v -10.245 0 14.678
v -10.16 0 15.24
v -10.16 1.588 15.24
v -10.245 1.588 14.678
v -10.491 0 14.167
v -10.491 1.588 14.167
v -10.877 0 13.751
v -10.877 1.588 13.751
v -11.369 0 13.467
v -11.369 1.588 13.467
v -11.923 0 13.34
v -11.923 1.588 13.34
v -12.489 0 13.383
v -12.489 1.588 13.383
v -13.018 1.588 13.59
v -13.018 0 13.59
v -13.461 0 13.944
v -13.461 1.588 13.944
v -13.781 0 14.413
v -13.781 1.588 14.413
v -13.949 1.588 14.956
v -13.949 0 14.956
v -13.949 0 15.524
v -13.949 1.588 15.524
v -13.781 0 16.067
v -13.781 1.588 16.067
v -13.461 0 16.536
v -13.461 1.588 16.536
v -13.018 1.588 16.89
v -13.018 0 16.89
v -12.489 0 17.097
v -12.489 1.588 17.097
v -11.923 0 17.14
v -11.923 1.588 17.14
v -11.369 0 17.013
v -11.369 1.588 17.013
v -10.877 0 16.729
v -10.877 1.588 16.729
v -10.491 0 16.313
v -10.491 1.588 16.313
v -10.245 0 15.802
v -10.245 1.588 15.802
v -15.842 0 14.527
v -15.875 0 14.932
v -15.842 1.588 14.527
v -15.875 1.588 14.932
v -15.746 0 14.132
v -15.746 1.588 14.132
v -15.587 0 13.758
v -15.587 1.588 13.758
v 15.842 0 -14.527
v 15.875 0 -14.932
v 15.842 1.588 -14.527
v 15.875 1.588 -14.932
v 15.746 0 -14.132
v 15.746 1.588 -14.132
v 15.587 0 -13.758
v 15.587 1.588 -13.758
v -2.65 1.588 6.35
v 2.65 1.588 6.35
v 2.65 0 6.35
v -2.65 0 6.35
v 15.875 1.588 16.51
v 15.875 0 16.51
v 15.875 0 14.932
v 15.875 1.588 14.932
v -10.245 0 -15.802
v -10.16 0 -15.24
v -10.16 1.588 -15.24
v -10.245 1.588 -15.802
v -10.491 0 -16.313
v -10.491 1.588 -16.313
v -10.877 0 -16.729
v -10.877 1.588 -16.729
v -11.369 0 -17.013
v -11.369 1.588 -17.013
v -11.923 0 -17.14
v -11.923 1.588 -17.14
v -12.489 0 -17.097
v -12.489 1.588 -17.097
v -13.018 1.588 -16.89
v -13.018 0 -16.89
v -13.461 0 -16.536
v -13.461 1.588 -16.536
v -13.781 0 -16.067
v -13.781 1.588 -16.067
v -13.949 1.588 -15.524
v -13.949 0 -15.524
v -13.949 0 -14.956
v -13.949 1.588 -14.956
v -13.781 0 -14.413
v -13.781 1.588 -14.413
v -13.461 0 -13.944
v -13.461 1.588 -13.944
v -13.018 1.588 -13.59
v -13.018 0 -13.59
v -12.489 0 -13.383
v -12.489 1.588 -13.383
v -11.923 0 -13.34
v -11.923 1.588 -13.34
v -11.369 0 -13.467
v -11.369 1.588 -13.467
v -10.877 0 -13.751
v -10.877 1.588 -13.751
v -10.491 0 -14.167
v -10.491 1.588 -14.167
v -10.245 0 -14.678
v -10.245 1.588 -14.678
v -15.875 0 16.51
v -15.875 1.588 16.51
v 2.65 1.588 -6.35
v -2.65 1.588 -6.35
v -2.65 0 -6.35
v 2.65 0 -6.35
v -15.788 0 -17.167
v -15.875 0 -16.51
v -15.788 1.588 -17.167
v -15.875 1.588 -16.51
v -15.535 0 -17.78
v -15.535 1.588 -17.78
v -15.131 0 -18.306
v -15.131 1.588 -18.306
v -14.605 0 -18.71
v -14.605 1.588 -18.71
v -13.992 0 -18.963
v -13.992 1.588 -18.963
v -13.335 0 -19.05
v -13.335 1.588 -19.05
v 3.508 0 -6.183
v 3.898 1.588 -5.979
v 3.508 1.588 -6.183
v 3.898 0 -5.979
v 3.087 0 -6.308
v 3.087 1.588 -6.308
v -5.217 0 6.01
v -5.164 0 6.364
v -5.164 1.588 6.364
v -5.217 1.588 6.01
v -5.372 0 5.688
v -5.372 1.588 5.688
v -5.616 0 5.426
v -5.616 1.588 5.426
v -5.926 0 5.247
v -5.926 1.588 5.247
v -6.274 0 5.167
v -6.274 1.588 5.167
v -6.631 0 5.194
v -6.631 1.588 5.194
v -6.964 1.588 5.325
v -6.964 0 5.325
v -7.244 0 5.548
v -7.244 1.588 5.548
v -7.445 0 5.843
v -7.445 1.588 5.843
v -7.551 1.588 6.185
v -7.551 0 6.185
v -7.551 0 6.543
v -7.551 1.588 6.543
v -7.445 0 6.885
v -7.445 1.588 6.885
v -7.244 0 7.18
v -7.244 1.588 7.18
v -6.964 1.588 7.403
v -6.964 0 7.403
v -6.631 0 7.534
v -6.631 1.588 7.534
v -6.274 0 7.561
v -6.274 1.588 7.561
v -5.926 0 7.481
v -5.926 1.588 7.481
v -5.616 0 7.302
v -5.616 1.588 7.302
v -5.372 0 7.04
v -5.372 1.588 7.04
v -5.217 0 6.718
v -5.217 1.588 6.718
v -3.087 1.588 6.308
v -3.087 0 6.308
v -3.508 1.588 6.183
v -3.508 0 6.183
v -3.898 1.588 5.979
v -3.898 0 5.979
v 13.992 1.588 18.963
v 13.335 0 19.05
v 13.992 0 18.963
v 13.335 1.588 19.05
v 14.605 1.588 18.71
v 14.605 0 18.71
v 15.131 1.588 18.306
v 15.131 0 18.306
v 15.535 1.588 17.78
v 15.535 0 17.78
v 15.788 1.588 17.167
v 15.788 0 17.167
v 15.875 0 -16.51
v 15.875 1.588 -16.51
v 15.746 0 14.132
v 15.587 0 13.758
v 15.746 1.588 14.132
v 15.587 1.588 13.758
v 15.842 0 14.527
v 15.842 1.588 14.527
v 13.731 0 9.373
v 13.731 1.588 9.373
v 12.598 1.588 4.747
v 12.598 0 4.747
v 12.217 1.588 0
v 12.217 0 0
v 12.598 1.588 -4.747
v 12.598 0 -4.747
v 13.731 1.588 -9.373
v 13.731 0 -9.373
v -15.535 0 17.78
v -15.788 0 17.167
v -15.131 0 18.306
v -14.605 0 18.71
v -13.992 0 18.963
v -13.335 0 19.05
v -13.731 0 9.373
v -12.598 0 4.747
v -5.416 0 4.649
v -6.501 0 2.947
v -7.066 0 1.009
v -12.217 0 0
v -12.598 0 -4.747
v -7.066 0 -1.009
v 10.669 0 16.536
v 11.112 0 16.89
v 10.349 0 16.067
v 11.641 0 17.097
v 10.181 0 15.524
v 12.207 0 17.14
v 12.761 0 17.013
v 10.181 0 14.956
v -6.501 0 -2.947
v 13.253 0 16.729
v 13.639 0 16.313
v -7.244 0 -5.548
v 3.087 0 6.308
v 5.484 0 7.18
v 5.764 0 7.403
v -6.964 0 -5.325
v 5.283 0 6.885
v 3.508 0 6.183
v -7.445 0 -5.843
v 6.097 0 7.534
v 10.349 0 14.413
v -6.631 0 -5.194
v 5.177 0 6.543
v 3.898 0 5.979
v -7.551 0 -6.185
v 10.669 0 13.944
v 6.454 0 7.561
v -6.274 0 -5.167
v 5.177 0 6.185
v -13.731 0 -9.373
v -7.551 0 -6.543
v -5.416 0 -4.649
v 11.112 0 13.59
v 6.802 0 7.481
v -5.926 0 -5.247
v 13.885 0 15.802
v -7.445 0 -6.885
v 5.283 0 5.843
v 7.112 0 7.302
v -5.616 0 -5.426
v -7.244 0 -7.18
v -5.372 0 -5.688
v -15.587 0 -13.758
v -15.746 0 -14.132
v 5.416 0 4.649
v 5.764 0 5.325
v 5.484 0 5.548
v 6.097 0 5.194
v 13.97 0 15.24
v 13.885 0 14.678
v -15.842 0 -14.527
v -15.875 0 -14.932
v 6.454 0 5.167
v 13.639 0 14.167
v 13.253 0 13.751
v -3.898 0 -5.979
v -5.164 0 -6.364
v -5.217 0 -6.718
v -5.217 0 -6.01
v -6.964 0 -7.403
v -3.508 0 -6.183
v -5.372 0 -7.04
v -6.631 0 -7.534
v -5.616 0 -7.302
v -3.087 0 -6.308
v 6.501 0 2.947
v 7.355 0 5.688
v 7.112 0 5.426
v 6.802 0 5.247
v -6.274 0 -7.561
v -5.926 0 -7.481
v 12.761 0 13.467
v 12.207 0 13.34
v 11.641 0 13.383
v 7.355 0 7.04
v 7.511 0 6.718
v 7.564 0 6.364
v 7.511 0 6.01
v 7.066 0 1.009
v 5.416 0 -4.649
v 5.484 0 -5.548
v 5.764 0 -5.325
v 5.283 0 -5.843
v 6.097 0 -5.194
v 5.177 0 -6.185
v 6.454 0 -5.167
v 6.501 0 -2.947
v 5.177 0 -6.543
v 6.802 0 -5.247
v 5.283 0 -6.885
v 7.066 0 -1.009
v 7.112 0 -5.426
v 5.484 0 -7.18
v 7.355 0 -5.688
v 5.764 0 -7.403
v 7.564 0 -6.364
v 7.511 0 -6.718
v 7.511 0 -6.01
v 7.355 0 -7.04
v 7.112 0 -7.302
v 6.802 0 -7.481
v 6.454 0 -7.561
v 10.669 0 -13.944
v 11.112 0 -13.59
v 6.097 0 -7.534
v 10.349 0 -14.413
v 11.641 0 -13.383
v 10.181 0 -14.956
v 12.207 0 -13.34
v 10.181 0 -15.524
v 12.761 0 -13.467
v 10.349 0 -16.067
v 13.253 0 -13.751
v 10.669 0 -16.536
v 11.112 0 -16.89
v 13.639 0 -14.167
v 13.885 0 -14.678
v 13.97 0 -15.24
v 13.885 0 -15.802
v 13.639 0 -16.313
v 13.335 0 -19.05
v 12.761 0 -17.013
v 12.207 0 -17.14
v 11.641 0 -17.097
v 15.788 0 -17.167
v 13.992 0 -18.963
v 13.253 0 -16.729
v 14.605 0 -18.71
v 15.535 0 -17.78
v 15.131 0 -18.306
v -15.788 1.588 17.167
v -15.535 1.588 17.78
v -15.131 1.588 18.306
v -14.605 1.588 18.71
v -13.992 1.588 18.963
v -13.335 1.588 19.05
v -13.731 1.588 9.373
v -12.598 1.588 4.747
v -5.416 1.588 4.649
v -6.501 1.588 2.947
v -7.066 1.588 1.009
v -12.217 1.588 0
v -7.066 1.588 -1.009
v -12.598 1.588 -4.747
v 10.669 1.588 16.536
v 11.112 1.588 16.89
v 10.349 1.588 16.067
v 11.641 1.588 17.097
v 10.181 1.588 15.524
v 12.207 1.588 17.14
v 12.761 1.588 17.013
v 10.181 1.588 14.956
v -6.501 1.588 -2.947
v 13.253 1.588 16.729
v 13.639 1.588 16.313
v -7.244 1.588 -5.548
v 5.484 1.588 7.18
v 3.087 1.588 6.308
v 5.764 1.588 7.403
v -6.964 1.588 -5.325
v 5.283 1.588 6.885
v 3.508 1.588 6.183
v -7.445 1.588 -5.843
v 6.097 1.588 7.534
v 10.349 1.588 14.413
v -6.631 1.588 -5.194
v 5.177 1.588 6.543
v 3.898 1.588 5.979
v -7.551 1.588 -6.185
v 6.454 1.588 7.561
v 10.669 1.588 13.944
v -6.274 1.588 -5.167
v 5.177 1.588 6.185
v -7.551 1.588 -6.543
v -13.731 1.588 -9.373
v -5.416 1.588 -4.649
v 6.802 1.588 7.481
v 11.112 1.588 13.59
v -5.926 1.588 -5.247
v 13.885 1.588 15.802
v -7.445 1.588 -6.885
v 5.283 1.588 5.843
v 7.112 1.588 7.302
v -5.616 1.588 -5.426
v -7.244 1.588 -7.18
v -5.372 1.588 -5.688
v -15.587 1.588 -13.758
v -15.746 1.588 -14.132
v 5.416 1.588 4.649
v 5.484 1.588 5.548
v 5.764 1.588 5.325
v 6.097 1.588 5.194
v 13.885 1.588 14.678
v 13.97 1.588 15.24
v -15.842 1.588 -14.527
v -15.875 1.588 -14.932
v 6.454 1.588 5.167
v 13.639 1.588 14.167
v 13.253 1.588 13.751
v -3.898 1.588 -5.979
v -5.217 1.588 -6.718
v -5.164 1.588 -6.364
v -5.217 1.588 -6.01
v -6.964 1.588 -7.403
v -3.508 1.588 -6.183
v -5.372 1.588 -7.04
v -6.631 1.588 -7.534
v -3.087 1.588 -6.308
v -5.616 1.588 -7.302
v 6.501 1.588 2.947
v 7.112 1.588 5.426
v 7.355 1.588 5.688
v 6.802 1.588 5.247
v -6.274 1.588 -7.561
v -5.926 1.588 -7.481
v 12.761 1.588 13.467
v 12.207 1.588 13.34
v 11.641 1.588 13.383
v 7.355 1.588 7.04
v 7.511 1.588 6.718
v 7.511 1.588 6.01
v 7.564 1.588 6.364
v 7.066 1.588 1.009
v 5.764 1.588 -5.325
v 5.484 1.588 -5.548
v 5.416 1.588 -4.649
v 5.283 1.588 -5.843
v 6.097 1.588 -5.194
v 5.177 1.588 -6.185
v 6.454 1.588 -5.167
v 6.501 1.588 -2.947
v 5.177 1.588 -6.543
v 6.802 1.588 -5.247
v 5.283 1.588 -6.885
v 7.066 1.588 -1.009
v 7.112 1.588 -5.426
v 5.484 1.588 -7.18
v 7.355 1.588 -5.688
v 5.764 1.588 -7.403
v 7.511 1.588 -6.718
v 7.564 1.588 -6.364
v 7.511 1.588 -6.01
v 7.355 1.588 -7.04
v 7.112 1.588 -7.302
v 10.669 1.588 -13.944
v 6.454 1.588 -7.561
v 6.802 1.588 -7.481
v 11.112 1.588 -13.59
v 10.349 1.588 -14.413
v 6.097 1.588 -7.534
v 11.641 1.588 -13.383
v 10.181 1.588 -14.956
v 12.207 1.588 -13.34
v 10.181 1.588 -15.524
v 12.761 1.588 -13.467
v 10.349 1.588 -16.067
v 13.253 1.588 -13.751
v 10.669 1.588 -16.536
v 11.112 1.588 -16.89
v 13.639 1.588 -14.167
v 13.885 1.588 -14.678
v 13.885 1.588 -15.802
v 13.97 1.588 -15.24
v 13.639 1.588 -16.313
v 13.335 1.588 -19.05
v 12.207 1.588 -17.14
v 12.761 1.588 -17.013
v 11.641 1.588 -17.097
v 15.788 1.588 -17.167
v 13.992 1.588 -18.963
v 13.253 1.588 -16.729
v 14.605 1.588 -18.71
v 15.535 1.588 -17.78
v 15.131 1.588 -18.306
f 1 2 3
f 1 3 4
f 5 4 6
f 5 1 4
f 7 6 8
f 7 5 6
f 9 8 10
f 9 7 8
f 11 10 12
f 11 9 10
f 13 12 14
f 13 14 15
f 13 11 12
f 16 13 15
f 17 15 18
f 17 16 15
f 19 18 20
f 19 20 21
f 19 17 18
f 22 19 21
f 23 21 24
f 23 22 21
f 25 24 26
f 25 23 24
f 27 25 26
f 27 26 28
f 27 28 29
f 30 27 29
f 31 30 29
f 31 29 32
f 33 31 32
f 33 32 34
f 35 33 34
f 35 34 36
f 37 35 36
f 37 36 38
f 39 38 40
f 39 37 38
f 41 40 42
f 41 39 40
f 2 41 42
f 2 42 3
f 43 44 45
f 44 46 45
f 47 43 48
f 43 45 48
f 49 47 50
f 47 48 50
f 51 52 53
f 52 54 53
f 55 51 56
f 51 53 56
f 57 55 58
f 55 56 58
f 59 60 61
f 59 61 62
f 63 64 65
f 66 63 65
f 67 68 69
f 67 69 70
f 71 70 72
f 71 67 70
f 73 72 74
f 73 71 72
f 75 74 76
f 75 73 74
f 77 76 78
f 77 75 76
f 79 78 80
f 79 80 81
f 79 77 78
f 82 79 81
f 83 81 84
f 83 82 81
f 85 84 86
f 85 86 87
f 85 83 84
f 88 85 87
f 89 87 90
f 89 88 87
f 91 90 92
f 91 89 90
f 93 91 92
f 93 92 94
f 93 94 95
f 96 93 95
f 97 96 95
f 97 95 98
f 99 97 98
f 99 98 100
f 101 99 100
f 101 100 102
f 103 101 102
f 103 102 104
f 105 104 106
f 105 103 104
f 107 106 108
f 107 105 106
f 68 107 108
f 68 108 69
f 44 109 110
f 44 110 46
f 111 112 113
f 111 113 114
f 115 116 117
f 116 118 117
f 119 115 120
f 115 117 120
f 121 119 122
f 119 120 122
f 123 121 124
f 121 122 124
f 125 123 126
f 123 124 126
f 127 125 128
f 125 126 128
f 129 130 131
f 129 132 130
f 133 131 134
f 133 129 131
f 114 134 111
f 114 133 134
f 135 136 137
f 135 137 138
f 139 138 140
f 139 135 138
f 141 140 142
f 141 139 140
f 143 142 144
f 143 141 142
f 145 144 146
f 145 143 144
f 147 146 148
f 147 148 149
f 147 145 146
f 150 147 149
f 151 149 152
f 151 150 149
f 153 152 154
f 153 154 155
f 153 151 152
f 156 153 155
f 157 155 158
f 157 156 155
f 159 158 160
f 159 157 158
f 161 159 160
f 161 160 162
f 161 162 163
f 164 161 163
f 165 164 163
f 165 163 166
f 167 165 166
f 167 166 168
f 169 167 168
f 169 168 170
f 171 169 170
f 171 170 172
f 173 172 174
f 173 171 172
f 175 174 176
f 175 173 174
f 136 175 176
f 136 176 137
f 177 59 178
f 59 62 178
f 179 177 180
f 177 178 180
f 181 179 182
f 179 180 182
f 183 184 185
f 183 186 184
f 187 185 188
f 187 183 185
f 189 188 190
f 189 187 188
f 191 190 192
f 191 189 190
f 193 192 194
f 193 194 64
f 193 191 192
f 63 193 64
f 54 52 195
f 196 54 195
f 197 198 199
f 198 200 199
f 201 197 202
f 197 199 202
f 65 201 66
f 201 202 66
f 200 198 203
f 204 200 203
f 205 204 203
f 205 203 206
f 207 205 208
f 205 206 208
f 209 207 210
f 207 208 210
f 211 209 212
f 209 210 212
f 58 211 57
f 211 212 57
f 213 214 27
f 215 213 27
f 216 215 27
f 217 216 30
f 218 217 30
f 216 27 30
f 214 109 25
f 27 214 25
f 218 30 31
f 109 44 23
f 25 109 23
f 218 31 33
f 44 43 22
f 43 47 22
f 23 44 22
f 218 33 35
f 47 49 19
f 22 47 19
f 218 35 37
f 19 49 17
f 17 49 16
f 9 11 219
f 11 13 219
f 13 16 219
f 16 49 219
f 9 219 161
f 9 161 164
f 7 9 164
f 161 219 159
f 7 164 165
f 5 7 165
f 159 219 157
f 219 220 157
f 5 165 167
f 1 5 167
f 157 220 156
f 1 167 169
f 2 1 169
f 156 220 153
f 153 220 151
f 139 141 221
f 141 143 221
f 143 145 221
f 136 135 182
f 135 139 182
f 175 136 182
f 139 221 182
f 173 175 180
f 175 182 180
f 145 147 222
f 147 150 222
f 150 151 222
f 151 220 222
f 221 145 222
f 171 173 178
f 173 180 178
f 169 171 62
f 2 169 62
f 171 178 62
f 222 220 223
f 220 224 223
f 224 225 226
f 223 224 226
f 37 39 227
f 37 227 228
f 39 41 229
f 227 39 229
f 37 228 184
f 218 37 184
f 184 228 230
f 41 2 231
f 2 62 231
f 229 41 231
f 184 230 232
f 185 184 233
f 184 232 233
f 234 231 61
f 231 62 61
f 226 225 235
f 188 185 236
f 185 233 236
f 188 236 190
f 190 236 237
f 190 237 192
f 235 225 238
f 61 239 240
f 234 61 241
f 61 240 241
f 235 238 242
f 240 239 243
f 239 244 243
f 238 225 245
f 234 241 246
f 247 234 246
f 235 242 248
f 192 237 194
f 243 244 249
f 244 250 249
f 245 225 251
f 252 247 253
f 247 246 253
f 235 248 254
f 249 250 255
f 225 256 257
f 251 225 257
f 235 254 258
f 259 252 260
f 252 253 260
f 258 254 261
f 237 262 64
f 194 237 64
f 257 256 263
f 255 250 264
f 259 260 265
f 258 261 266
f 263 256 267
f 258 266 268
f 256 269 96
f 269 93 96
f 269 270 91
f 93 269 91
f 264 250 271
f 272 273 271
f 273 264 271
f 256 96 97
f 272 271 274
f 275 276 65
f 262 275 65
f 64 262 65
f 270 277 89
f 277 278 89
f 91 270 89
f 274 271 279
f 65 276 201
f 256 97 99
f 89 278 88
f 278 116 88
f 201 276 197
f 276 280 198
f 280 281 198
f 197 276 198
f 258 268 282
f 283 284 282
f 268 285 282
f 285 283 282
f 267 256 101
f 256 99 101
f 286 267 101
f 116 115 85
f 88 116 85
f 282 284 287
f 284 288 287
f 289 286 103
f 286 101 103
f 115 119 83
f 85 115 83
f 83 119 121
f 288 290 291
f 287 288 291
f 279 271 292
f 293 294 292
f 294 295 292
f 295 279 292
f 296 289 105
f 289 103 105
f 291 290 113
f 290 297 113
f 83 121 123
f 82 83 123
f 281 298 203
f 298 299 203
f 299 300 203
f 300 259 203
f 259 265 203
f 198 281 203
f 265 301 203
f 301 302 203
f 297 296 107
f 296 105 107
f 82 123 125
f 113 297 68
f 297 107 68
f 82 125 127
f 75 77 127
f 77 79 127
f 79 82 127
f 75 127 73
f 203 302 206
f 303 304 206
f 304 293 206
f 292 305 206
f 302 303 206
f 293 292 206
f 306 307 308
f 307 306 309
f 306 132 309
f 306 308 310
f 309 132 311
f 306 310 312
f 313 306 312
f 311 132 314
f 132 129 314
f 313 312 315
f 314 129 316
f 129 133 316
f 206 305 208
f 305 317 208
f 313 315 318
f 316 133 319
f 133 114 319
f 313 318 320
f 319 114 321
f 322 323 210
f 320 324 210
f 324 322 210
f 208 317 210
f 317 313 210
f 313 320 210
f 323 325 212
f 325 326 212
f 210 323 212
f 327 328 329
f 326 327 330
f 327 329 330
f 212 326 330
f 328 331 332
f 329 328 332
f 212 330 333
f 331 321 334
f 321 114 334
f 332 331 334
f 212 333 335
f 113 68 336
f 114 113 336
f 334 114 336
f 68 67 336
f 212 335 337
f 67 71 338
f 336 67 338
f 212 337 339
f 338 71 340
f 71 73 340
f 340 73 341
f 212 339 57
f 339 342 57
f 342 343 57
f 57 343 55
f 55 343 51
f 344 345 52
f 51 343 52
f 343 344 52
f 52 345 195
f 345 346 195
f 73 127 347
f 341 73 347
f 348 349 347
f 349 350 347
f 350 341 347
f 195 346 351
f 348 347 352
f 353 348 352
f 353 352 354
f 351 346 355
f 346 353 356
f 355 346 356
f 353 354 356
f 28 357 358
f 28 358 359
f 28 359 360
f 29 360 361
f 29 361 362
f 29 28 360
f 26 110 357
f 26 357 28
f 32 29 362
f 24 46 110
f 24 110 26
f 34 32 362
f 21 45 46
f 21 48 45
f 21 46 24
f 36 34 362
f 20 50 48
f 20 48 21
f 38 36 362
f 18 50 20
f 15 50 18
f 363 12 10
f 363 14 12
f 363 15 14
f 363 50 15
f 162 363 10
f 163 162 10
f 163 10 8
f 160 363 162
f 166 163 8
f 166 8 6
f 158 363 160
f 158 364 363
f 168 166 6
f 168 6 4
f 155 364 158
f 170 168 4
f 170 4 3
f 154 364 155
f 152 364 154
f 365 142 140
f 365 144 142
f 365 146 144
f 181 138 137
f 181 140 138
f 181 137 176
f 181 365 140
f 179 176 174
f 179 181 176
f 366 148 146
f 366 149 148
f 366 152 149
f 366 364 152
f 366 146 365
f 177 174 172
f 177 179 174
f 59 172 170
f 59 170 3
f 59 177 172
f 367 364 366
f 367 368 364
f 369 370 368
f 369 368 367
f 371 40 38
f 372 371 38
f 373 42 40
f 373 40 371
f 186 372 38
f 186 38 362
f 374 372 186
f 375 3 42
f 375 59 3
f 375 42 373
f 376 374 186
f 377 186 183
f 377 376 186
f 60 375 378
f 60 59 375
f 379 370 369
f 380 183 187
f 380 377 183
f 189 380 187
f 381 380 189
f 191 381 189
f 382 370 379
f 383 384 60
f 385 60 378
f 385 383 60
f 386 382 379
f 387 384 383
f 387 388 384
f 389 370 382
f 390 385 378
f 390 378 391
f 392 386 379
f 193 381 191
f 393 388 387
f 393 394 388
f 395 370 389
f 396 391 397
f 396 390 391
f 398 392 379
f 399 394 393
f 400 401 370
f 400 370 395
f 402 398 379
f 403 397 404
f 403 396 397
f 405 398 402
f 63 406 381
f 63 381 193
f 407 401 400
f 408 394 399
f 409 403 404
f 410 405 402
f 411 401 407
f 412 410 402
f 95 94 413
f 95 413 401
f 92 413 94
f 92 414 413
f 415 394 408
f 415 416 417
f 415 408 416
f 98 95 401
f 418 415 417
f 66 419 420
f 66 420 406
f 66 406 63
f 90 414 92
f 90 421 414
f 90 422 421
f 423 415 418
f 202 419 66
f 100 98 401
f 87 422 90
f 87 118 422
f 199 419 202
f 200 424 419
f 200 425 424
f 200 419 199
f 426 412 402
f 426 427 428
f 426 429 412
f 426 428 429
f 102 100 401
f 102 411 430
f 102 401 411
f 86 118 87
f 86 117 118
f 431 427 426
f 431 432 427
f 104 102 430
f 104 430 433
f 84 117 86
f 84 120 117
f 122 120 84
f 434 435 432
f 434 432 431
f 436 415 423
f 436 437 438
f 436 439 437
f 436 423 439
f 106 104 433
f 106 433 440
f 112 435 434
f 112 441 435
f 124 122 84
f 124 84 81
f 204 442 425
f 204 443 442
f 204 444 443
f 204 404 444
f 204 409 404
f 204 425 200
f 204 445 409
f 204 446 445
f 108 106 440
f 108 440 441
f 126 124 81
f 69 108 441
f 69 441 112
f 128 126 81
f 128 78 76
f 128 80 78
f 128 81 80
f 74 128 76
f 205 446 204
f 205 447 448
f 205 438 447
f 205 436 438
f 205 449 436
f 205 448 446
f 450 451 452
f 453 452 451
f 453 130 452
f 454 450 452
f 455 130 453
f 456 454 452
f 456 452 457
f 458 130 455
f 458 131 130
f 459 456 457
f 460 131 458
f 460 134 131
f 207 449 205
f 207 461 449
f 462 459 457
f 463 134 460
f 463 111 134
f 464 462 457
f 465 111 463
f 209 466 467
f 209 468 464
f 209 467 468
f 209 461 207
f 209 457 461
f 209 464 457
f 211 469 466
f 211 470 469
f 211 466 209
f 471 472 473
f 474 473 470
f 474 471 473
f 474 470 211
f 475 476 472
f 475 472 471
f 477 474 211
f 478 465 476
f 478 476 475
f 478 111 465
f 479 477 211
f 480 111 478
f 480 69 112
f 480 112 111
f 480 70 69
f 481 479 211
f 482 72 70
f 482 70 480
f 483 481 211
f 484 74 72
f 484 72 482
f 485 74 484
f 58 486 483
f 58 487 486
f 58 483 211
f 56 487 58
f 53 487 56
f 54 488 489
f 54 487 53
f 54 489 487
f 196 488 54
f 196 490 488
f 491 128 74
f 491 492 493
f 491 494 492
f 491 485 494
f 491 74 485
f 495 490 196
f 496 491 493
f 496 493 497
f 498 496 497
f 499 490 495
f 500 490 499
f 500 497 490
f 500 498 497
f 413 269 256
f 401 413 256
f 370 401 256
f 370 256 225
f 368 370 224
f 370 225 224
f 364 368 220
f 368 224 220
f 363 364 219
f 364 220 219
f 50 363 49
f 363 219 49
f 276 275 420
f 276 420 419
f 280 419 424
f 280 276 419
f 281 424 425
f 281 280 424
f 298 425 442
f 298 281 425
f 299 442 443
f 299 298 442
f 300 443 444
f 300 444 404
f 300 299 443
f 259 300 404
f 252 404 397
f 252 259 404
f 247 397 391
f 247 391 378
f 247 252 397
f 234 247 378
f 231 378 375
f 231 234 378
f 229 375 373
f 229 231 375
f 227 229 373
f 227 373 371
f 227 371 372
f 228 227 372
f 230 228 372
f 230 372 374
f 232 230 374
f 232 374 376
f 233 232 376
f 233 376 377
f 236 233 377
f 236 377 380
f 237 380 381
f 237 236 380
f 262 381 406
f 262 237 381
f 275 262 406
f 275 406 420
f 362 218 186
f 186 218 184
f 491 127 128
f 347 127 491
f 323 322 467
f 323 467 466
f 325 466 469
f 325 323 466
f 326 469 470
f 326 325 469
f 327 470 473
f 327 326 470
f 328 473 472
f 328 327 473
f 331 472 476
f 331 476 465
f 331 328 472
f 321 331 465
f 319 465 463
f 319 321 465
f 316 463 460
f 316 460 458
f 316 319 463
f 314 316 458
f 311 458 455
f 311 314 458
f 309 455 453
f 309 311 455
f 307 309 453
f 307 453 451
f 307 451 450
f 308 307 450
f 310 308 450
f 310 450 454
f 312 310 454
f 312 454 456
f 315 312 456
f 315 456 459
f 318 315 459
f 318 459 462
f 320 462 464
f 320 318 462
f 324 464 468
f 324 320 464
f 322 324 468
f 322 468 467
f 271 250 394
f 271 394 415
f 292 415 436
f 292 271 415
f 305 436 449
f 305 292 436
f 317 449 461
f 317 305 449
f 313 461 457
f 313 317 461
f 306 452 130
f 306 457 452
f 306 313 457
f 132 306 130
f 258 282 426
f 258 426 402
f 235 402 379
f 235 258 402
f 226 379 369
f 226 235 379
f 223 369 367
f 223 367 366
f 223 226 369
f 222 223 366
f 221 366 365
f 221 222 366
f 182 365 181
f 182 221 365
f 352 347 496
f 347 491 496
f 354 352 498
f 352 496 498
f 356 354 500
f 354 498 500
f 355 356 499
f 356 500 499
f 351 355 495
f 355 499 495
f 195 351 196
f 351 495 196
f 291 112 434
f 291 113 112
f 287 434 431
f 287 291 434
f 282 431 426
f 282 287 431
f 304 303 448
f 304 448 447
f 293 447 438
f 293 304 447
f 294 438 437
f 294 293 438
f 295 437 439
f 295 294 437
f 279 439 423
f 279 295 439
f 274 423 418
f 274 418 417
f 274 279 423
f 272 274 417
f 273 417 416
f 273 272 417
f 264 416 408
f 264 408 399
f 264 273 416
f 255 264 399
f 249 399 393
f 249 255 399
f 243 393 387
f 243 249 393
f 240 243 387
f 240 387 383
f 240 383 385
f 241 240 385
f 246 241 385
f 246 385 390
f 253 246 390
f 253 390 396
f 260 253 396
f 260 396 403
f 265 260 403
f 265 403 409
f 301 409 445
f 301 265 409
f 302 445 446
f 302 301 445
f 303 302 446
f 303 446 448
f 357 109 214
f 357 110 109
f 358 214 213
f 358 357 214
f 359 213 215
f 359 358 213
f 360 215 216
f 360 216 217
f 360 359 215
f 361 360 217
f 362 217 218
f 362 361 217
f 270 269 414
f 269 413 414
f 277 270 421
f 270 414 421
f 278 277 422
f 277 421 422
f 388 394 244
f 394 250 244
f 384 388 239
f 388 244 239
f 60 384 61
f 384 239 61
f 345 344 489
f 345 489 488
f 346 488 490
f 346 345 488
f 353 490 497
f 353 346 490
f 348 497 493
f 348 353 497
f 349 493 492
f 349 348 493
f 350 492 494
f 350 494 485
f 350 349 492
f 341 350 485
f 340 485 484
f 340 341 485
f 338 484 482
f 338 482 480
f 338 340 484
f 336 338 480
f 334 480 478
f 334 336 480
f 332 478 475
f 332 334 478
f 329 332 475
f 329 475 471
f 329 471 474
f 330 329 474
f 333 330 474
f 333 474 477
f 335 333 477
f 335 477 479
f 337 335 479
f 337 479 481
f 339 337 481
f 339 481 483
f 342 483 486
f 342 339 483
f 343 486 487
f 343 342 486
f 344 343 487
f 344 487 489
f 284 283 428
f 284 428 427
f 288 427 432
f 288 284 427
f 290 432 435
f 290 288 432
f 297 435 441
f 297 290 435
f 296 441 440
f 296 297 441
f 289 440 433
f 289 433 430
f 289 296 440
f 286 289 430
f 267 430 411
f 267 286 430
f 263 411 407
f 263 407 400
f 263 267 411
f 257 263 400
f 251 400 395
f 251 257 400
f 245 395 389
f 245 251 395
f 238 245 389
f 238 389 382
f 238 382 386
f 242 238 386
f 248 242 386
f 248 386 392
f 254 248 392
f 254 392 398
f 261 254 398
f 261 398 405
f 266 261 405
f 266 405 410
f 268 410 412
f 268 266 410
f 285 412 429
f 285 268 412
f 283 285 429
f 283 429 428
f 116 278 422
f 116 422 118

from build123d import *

# Parameters (mm, degrees)
SKETCH1_W           = 31.75
SKETCH1_H           = 38.1
SKETCH1_R           = 7.1374
SKETCH1_R_2         = 1.2
SKETCH1_R_3         = 1.905
BOSS_EXTRUDE1_DEPTH = 1.5875
BOSS_EXTRUDE3_DEPTH = 1.5875
CUT_EXTRUDE1_DEPTH  = 2.5875
FILLET3_R           = 2.54
FILLET2_R           = 2.286


with BuildPart() as part:
    # Sketch1 → Boss-Extrude1 (new body)
    with BuildSketch(Plane(origin=(0, 0, 0), x_dir=(1, 0, 0), z_dir=(0, 1, 0))):
        Rectangle(SKETCH1_W, SKETCH1_H)
        Circle(SKETCH1_R, mode=Mode.SUBTRACT)
        with Locations((-6.363961031, -6.363961031)):
            Circle(SKETCH1_R_2, mode=Mode.SUBTRACT)
        with Locations((-6.363961031, 6.363961031)):
            Circle(SKETCH1_R_2, mode=Mode.SUBTRACT)
        with Locations((6.363961031, 6.363961031)):
            Circle(SKETCH1_R_2, mode=Mode.SUBTRACT)
        with Locations((6.363961031, -6.363961031)):
            Circle(SKETCH1_R_2, mode=Mode.SUBTRACT)
        with Locations((-12.065, -15.24)):
            Circle(SKETCH1_R_3, mode=Mode.SUBTRACT)
        with Locations((-12.065, 15.24)):
            Circle(SKETCH1_R_3, mode=Mode.SUBTRACT)
        with Locations((12.065, 15.24)):
            Circle(SKETCH1_R_3, mode=Mode.SUBTRACT)
        with Locations((12.065, -15.24)):
            Circle(SKETCH1_R_3, mode=Mode.SUBTRACT)
    extrude(amount=BOSS_EXTRUDE1_DEPTH)

    # Sketch3 → Boss-Extrude3 (add, through all)
    with BuildSketch(Plane(origin=(0, 1.5875, 0), x_dir=(1, 0, 0), z_dir=(0, 1, 0))):
        with BuildLine():
            Line((-3.258830889, 6.35), (3.258830889, 6.35))
            ThreePointArc((3.258830889, 6.35), (0, 7.1374), (-3.258830889, 6.35))
        make_face()
        with BuildLine():
            Line((3.258830889, -6.35), (-3.258830889, -6.35))
            ThreePointArc((-3.258830889, -6.35), (0, -7.1374), (3.258830889, -6.35))
        make_face()
    extrude(amount=-BOSS_EXTRUDE3_DEPTH)

    # Sketch4 → Cut-Extrude1 (cut, through all)
    with BuildSketch(Plane.XZ):
        with BuildLine():
            Line((-15.875, 14.296387236), (-15.875, -14.296387236))
            ThreePointArc((-15.875, -14.296387236), (-12.2174, 0), (-15.875, 14.296387236))
        make_face()
        with BuildLine():
            Line((15.875, -14.296387236), (15.875, 14.296387236))
            ThreePointArc((15.875, 14.296387236), (12.2174, 0), (15.875, -14.296387236))
        make_face()
    extrude(amount=-CUT_EXTRUDE1_DEPTH, mode=Mode.SUBTRACT)

    # Fillet3
    fillet3_edges = [part.edges().sort_by_distance(p)[0] for p in [
        (-15.875, 0.79375, 14.296387236),
        (-15.875, 0.79375, -14.296387236),
        (15.875, 0.79375, 19.05),
        (-15.875, 0.79375, 19.05),
        (15.875, 0.79375, -14.296387236),
        (-15.875, 0.79375, -19.05),
        (15.875, 0.79375, 14.296387236),
        (15.875, 0.79375, -19.05),
    ]]
    fillet(fillet3_edges, radius=FILLET3_R)

    # Fillet2
    fillet2_edges = [part.edges().sort_by_distance(p)[0] for p in [
        (-3.258830889, 0.79375, -6.35),
        (3.258830889, 0.79375, -6.35),
        (3.258830889, 0.79375, 6.35),
        (-3.258830889, 0.79375, 6.35),
    ]]
    fillet(fillet2_edges, radius=FILLET2_R)


solid = part.part
